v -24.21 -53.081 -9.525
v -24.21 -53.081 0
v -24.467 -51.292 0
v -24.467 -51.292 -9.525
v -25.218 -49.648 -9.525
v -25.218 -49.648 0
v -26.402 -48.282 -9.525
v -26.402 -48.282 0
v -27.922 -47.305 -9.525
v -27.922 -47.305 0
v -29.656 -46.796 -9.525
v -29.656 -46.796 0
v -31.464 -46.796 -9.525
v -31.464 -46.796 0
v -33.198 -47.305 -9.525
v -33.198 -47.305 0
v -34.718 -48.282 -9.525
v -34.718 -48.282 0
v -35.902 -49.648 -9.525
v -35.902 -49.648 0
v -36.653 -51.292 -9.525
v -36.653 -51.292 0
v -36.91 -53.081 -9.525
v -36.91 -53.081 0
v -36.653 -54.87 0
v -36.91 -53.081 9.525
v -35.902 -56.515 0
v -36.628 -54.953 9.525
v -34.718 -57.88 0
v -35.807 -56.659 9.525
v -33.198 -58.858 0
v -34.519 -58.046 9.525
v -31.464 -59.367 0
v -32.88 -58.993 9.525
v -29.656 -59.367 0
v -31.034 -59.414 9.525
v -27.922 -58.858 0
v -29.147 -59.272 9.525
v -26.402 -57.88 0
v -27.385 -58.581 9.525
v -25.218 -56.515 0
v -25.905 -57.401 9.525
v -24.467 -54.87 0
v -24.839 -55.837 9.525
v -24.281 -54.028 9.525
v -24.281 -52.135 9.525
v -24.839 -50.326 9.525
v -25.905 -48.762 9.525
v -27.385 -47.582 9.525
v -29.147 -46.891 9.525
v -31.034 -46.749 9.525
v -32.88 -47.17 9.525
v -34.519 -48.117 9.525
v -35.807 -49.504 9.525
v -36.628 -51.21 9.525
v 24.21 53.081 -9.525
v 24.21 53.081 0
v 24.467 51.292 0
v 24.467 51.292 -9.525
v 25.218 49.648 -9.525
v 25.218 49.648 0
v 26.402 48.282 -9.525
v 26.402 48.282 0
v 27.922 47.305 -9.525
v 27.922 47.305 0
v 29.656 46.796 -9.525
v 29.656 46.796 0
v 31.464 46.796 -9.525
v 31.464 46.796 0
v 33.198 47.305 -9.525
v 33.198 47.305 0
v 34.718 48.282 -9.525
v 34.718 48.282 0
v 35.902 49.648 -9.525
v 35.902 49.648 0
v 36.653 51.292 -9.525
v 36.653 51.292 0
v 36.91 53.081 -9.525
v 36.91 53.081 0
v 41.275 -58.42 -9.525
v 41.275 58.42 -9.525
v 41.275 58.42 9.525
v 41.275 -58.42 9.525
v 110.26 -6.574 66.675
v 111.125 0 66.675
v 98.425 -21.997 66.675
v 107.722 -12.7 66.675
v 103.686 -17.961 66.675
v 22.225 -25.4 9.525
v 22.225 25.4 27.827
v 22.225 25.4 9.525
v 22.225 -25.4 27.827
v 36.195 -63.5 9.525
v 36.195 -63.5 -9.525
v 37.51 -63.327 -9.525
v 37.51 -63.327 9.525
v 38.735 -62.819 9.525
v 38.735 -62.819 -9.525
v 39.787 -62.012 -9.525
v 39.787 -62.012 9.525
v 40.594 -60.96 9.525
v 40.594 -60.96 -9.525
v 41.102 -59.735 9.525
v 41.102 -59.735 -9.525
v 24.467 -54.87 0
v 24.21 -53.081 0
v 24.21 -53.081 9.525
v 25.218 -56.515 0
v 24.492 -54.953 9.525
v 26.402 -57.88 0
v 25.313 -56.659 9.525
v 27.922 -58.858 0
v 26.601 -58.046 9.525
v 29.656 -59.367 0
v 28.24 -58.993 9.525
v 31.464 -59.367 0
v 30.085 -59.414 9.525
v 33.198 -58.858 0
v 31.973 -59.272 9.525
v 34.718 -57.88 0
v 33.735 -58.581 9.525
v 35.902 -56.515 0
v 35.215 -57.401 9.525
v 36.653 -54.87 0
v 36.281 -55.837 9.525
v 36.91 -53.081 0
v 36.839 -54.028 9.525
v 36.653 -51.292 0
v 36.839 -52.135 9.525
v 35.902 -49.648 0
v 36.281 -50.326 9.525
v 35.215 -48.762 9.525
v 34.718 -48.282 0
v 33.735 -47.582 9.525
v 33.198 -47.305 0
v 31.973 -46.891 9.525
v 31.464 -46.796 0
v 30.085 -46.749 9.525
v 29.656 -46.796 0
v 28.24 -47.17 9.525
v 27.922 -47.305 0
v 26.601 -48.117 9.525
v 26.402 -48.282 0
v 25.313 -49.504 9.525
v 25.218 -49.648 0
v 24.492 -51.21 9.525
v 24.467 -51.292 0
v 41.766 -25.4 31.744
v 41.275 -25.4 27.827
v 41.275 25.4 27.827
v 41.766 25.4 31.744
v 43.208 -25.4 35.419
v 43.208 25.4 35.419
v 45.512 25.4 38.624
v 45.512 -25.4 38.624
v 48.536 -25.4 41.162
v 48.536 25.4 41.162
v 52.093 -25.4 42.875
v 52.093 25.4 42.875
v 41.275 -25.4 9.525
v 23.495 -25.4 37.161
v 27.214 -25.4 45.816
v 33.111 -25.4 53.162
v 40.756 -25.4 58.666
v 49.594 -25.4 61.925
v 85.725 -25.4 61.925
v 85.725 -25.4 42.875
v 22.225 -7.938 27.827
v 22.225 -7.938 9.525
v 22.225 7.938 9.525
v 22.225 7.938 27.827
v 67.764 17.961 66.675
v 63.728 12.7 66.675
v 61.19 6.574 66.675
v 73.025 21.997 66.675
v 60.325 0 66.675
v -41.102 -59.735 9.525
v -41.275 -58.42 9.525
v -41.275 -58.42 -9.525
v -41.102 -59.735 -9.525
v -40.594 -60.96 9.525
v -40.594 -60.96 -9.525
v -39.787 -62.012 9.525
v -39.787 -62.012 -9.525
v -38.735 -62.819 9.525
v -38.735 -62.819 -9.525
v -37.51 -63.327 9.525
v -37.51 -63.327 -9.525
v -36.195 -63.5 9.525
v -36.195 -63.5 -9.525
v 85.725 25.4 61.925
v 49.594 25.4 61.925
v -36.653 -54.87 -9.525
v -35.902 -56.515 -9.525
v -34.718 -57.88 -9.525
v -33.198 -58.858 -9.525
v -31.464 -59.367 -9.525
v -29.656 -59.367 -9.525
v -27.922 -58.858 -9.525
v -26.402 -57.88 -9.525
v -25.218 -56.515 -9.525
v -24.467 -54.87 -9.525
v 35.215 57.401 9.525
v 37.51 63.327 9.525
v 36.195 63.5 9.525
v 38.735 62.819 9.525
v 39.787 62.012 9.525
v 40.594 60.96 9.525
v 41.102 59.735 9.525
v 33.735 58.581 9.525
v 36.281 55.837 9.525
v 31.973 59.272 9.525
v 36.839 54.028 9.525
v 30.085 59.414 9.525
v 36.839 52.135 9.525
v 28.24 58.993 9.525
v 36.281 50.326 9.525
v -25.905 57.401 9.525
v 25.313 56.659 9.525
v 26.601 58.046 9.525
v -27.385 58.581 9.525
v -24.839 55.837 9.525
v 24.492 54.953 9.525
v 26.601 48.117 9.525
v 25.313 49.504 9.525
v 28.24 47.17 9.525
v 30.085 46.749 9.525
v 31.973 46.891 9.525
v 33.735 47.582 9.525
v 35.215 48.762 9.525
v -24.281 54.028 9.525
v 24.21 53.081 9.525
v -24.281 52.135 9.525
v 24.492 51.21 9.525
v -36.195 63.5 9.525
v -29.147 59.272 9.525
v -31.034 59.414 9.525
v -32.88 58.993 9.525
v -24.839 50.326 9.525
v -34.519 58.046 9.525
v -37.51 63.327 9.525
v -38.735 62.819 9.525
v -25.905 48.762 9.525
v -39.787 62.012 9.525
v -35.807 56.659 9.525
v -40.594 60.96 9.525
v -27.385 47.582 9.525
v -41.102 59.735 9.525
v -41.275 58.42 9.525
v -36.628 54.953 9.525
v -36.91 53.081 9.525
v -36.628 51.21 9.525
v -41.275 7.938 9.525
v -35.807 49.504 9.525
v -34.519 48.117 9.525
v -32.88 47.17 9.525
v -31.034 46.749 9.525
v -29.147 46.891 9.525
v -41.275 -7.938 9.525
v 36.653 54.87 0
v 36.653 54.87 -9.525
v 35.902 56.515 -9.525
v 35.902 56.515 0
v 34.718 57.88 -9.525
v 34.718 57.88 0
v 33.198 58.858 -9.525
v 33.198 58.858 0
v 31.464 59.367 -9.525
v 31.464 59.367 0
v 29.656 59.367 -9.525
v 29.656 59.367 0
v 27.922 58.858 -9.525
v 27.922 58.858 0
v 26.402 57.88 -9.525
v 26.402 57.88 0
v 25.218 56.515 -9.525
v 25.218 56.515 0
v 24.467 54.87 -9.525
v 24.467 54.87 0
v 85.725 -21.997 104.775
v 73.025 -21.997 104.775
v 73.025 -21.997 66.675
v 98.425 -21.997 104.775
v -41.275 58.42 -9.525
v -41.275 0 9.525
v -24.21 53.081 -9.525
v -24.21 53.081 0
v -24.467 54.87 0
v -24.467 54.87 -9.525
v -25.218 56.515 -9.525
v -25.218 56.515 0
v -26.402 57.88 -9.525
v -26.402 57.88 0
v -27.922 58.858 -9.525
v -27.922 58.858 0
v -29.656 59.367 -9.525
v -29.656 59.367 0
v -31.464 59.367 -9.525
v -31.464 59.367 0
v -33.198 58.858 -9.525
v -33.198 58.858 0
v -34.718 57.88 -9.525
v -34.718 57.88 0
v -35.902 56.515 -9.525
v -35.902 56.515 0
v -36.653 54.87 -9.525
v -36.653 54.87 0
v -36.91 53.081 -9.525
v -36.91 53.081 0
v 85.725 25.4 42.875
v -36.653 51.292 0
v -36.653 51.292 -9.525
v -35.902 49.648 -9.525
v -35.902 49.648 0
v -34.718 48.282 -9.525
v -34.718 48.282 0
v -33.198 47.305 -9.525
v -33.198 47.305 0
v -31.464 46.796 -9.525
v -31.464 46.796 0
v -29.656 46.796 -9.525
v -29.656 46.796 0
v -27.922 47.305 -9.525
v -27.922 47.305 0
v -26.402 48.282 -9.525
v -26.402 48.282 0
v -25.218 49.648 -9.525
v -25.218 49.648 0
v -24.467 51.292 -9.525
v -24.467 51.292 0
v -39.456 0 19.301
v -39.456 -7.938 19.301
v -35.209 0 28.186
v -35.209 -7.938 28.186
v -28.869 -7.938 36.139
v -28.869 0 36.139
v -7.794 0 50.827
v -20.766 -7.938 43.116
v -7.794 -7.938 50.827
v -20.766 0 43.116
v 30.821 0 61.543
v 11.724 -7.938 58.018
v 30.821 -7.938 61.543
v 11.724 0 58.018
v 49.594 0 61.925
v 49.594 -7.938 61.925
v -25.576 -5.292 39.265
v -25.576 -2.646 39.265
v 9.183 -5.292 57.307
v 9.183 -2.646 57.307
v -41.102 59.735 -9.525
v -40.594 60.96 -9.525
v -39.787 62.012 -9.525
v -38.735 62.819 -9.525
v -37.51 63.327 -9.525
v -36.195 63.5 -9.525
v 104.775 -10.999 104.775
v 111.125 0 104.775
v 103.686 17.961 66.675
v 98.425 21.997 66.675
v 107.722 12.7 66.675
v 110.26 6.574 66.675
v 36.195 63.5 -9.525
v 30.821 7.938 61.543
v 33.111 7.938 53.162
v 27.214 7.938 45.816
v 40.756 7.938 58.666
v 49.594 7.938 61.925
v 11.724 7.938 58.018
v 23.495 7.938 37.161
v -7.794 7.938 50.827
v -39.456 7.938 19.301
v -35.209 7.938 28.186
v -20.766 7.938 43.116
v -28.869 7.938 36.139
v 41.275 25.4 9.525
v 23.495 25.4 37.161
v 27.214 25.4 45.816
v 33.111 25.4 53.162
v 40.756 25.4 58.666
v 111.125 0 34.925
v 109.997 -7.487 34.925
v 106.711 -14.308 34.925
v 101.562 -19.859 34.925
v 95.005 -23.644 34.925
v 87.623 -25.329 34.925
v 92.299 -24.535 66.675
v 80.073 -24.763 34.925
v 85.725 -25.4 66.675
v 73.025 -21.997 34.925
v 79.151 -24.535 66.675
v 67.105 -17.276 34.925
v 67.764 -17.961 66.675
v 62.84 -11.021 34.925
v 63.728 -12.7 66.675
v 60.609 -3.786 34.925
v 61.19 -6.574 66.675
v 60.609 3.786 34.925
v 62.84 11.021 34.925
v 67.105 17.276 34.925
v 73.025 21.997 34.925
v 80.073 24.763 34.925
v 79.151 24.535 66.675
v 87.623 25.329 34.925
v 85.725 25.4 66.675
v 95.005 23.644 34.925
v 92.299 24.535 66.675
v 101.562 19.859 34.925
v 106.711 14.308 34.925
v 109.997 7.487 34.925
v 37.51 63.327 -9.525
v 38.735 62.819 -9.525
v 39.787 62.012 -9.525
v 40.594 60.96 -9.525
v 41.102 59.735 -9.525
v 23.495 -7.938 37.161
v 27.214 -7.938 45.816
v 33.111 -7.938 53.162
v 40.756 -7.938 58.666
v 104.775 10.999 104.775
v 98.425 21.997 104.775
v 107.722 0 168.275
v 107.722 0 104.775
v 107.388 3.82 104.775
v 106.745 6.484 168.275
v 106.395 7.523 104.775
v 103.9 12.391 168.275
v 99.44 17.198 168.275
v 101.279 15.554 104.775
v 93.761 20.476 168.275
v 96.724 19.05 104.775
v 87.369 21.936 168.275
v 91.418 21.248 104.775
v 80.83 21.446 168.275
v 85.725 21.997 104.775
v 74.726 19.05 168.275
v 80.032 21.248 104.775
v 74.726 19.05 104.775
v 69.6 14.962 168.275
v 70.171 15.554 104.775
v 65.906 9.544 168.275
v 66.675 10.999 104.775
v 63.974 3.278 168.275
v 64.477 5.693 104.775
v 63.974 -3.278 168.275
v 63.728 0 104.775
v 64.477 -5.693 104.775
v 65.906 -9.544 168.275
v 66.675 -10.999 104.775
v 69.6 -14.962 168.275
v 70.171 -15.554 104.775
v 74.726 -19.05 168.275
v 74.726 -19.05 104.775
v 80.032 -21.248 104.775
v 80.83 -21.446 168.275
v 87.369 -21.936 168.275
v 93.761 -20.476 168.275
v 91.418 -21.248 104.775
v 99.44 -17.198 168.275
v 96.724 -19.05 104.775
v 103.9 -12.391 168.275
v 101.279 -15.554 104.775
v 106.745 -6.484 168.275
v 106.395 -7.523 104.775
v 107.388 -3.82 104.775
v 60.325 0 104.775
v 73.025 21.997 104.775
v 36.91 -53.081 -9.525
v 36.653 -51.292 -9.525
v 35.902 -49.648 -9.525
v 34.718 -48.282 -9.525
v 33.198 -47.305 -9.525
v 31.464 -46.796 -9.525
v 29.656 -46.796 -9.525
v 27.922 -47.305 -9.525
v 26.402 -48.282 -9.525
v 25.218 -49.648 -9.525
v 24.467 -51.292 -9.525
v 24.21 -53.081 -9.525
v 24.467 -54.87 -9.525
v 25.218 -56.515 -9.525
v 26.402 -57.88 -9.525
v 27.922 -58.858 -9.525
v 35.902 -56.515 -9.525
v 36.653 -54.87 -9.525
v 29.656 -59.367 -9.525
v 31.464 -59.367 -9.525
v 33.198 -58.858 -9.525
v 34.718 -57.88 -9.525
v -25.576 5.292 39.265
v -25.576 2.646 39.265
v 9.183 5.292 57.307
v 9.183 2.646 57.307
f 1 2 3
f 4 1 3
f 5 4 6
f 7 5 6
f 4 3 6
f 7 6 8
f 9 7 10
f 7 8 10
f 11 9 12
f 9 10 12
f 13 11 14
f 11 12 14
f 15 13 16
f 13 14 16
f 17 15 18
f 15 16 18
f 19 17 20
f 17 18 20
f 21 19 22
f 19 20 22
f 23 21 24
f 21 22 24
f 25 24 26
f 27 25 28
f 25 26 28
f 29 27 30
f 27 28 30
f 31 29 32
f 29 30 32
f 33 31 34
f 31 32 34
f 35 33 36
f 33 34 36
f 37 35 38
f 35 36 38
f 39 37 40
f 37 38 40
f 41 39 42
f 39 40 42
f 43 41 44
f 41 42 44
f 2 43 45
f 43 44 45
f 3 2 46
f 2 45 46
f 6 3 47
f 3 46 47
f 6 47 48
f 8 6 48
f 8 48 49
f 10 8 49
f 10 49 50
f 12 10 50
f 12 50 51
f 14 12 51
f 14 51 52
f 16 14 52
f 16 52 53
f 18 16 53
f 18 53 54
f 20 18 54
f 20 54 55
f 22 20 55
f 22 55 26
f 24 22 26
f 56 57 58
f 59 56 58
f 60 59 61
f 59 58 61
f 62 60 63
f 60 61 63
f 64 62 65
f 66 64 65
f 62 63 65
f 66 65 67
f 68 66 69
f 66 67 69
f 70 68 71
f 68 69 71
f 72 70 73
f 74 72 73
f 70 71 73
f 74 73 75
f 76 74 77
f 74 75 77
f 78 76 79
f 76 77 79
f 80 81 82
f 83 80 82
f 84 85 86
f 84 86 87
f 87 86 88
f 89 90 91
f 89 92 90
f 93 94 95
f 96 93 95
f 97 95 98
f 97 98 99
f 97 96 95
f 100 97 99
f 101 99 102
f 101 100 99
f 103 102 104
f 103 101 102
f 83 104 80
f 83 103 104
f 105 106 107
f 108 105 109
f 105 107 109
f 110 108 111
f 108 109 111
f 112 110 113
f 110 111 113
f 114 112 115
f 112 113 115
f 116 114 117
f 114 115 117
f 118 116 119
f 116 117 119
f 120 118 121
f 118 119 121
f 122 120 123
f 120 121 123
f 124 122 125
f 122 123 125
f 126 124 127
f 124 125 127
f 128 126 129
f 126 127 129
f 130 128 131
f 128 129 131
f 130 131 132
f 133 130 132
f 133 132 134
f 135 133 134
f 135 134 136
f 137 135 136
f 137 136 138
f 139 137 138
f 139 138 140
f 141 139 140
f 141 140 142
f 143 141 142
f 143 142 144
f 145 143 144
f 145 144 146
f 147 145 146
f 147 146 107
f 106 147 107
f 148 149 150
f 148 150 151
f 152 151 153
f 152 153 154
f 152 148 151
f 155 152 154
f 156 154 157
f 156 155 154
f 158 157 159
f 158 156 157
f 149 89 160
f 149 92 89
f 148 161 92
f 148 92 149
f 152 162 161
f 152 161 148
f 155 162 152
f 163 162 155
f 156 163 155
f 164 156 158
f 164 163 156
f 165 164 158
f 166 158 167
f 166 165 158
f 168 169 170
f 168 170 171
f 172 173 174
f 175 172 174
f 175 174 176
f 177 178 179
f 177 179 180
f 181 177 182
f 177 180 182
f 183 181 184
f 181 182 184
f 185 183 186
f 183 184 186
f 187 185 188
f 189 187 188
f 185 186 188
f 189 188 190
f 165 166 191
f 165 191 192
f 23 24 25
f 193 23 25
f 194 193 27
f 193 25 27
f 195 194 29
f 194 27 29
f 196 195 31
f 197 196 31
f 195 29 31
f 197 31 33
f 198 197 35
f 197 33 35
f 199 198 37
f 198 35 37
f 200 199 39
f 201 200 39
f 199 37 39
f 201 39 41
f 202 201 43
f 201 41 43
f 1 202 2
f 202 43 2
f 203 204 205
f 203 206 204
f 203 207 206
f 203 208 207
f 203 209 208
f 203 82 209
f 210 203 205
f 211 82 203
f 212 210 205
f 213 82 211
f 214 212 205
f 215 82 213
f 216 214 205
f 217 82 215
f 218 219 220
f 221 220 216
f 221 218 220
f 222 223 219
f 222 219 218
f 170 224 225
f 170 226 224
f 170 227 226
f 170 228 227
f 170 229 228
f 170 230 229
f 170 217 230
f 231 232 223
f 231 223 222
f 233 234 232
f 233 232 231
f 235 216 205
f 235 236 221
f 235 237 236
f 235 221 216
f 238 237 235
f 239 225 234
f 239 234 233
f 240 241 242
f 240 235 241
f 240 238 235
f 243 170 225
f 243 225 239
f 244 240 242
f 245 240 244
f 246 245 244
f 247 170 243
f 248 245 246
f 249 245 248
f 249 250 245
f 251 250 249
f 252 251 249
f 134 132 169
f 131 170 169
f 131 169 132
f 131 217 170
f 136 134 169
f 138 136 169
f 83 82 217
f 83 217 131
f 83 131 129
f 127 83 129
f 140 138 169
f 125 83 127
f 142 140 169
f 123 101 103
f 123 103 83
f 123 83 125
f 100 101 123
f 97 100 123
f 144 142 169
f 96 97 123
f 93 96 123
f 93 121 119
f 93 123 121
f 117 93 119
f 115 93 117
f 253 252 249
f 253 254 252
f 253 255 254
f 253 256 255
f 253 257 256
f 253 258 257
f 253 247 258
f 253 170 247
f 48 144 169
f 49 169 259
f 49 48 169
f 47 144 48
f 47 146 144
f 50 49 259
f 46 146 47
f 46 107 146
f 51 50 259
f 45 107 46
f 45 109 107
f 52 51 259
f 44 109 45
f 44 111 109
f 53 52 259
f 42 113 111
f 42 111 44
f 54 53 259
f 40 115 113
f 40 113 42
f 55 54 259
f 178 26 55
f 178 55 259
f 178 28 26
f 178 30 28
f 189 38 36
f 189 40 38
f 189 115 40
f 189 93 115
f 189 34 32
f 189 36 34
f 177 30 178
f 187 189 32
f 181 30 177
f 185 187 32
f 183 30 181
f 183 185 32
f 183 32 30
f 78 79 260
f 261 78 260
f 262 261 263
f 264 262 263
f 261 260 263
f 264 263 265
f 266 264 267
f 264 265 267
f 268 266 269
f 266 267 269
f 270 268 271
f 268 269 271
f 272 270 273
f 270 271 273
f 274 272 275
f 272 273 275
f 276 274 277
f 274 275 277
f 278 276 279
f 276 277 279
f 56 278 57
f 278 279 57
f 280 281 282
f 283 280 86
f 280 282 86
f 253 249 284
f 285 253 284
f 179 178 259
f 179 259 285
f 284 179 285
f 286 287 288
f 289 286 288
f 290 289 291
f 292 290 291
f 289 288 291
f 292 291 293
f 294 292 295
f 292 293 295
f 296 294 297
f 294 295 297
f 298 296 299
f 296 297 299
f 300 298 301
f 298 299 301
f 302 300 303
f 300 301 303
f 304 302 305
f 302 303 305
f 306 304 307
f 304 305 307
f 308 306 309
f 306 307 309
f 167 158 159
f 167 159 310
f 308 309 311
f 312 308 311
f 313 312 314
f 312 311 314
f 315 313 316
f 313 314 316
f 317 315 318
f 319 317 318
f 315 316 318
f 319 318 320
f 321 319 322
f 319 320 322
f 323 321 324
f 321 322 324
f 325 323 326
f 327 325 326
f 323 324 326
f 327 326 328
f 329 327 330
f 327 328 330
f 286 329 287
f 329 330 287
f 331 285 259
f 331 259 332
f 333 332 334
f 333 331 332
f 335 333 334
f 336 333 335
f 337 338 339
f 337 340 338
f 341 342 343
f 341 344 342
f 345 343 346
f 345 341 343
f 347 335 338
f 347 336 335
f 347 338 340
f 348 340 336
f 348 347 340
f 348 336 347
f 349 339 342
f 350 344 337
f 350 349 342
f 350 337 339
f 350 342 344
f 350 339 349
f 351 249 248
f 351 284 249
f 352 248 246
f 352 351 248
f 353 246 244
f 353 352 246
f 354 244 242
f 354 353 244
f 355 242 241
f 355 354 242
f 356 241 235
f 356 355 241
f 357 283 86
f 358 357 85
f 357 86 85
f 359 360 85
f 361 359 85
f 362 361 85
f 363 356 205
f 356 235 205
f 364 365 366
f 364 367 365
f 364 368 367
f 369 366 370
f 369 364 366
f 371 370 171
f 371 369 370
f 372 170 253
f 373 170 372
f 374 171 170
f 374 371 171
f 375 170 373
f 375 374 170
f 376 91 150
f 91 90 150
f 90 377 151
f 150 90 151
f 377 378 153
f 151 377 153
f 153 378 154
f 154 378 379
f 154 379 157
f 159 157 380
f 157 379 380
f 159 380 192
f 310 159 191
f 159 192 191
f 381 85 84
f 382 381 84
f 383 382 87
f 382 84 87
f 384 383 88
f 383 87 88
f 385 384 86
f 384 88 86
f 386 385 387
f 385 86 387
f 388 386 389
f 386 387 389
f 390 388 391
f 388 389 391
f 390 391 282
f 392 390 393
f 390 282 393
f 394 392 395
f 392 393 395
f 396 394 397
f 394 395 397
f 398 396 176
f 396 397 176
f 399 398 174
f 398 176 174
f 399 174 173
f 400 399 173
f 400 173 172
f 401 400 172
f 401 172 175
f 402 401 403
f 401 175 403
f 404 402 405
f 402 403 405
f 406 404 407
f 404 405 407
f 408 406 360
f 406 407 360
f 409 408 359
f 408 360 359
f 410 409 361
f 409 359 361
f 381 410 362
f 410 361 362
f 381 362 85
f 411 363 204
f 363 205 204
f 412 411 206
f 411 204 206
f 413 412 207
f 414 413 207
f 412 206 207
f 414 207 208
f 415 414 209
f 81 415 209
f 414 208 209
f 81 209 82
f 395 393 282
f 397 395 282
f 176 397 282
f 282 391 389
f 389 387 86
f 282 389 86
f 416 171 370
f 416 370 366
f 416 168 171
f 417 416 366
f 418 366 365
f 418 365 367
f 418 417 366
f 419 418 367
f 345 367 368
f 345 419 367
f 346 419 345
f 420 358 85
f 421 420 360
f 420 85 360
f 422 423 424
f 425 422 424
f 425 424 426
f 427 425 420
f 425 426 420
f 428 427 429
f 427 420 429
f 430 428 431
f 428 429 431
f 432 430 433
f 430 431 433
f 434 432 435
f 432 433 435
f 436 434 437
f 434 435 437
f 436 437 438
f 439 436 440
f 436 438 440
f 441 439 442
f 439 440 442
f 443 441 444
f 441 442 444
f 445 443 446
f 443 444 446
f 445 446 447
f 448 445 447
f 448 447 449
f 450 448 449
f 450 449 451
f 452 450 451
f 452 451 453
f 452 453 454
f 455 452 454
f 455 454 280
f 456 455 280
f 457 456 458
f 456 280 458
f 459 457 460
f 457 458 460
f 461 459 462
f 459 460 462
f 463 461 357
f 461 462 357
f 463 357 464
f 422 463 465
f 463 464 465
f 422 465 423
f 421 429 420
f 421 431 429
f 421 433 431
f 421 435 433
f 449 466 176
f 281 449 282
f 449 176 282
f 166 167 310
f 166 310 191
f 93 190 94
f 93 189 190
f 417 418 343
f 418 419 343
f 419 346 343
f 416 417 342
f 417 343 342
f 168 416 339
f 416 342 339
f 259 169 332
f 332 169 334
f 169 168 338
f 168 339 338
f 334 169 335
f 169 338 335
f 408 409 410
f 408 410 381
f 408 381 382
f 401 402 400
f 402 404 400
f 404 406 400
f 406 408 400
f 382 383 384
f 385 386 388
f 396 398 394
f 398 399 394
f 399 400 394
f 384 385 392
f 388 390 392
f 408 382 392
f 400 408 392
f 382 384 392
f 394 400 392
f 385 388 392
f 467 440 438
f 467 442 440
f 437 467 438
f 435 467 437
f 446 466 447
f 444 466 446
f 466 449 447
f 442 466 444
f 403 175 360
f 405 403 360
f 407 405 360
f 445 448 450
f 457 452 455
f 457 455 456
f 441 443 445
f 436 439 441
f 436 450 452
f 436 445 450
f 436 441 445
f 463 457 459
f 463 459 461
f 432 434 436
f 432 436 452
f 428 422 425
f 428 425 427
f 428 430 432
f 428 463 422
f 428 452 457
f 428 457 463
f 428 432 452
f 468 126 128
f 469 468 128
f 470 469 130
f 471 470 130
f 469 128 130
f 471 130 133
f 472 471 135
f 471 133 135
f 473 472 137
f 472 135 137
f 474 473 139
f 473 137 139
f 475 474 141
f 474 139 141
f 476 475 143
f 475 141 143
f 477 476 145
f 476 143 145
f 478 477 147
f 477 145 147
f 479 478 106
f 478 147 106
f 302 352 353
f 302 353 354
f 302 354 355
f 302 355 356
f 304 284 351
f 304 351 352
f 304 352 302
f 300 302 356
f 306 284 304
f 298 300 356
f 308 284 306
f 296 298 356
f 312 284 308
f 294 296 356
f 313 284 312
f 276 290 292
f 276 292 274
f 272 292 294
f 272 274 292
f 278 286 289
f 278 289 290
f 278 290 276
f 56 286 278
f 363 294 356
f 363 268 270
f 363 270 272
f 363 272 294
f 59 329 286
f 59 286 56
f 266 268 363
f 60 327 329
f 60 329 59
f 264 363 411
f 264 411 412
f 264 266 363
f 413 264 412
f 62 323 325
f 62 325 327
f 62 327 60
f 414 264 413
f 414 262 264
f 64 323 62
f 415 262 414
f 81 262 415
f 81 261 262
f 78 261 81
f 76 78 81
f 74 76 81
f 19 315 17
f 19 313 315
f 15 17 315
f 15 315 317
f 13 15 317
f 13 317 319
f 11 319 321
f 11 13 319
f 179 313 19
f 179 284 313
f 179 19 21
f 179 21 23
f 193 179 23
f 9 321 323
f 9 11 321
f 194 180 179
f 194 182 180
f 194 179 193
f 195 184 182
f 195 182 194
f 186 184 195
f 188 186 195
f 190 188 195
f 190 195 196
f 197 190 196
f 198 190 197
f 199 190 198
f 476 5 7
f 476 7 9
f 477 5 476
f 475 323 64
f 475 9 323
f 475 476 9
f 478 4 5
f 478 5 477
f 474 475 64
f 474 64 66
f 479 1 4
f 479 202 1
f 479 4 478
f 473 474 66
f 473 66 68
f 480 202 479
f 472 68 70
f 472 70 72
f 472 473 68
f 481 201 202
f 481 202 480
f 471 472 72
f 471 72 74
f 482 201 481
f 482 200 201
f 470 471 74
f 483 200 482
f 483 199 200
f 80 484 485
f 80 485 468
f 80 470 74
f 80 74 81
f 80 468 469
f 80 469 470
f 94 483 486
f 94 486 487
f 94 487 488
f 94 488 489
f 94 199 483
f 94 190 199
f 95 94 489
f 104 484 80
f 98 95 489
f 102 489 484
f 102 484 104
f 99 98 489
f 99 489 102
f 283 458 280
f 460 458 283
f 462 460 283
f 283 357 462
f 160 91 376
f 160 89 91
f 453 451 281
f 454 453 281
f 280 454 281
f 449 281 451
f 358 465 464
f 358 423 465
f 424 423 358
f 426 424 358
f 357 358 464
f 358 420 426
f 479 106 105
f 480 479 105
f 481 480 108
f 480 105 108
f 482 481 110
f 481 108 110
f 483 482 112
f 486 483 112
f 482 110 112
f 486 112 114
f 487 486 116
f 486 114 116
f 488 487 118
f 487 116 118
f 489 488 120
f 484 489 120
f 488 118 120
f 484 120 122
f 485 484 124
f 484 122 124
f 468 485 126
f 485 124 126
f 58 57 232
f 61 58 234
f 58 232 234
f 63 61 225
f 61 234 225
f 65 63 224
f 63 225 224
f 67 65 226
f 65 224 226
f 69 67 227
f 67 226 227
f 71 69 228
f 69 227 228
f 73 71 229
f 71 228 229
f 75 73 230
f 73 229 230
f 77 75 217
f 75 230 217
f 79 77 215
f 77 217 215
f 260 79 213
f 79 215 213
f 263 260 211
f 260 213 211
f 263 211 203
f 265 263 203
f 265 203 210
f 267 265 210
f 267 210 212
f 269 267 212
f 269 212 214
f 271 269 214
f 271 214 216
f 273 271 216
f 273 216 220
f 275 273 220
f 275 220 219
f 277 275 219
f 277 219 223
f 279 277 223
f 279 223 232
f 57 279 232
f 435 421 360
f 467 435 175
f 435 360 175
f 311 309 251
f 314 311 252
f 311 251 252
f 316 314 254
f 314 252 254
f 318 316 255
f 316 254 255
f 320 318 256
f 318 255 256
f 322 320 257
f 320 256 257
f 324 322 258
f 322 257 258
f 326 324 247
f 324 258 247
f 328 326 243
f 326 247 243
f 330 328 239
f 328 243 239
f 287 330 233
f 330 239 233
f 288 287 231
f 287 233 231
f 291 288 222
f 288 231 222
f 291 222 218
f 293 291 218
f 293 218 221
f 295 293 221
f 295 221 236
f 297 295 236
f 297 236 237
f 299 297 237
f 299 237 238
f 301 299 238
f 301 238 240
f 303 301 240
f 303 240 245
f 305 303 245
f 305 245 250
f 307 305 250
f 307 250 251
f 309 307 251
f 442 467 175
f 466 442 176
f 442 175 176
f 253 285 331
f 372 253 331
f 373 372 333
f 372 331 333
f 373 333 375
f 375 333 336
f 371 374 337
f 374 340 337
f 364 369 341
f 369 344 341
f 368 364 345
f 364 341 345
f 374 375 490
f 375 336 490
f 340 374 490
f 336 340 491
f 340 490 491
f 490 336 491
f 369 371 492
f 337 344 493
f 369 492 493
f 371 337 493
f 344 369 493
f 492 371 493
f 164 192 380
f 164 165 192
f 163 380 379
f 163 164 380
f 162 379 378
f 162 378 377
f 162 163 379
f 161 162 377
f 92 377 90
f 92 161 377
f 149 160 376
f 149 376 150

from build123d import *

# Parameters (mm, degrees)
F1_DEPTH  = 63.5
F0_W      = 25.4
F0_H      = 19.05
F2_DEPTH  = 25.4
F3_DEPTH  = 7.9375
F5_R      = 5.08
F7_D      = 12.7
F7_DEPTH  = 9.526
F8_D      = 12.7
F10_DEPTH = 38.1
F11_R     = 21.9970452561
F12_DEPTH = 63.5


with BuildPart() as f1:
    # F0 (on Front) → F1 (new body, symmetric)
    with BuildSketch(Plane.XZ):
        Polygon((-41.275, 9.525), (-41.275, -9.525), (41.275, -9.525), (41.275, 9.525), (22.225, 9.525), align=None)
    extrude(amount=F1_DEPTH, both=True)

    # F0 (on Front) → F3 (join, symmetric)
    with BuildSketch(Plane.XZ):
        with BuildLine():
            add(Edge.make_bspline(
                [(-41.275, 9.525), (-39.5751334727, 44.5398315787), (10.8261717876, 64.5929351449), (49.5941065045, 61.9252)],
                knots=[0, 0, 0, 0, 104.8950688877, 104.8950688877, 104.8950688877, 104.8950688877], degree=3))
            Line((-41.275, 9.525), (22.225, 9.525))
            Line((22.225, 9.525), (22.225, 27.8273393855))
            ThreePointArc((22.225, 27.8273393855), (29.9135794814, 49.6890186974), (49.5941065045, 61.9252))
        make_face()
    extrude(amount=F3_DEPTH, both=True)

    # F5
    f5_edges = [f1.edges().sort_by_distance(p)[0] for p in [
        (41.275, -63.5, 0),
        (-41.275, -63.5, 0),
        (41.275, 63.5, 0),
        (-41.275, 63.5, 0),
    ]]
    fillet(f5_edges, radius=F5_R)

    # F7 (through all, one way)
    with BuildSketch(Plane.XY):
        with Locations((30.559932813, 53.0814602971), (-30.559932813, 53.0814602971), (-30.559932813, -53.0814602971), (30.559932813, -53.0814602971)):
            Circle(F7_D / 2)
    extrude(amount=-F7_DEPTH, mode=Mode.SUBTRACT)

    # F8 (through all)
    with Locations(Plane(origin=(0, 0, 0), x_dir=(1, 0, 0), z_dir=(0, 0, -1))):
        with Locations((-30.559932813, -53.0814602971), (30.559932813, -53.0814602971), (-30.559932813, 53.0814602971), (30.559932813, 53.0814602971)):
            Hole(F8_D / 2)


with BuildPart() as f2:
    # F0 (on Front) → F2 (new body, symmetric)
    with BuildSketch(Plane.XZ):
        with BuildLine():
            Line((22.225, 9.525), (41.275, 9.525))
            Line((41.275, 9.525), (41.275, 27.8273393855))
            ThreePointArc((41.275, 27.8273393855), (44.2600388457, 37.0936507574), (52.0925781343, 42.8752))
            Line((52.0925781343, 42.8752), (60.325, 42.8752))
            Line((60.325, 42.8752), (60.325, 61.9252))
            Line((60.325, 61.9252), (49.5941065045, 61.9252))
            ThreePointArc((49.5941065045, 61.9252), (29.9135794814, 49.6890186974), (22.225, 27.8273393855))
            Line((22.225, 27.8273393855), (22.225, 9.525))
        make_face()
        with Locations((73.025, 52.4002)):
            Rectangle(F0_W, F0_H)
    extrude(amount=F2_DEPTH, both=True)


with BuildPart() as f4:
    # F0 (on Front) → F4 (revolve)
    with BuildSketch(Plane.XZ):
        Polygon((85.725, 66.675), (85.725, 61.9252), (85.725, 42.8752), (85.725, 34.925), (111.125, 34.925), (111.125, 66.675), align=None)
    revolve(axis=Axis((85.725, 0, 50.8), (0, 0, -1)))

    # F9 (on face) → F10 (join)
    with BuildSketch(Plane.XY.offset(66.675)):
        Polygon((98.425, -21.9970452561), (111.125, 0), (98.425, 21.9970452561), (73.025, 21.9970452561), (60.325, 0), (73.025, -21.9970452561), align=None)
    extrude(amount=F10_DEPTH)

    # F11 (on face) → F12 (join)
    with BuildSketch(Plane.XY.offset(104.775)):
        with Locations((85.725, 0)):
            Circle(F11_R)
    extrude(amount=F12_DEPTH)


solid = Compound([f1.part, f2.part, f4.part])
